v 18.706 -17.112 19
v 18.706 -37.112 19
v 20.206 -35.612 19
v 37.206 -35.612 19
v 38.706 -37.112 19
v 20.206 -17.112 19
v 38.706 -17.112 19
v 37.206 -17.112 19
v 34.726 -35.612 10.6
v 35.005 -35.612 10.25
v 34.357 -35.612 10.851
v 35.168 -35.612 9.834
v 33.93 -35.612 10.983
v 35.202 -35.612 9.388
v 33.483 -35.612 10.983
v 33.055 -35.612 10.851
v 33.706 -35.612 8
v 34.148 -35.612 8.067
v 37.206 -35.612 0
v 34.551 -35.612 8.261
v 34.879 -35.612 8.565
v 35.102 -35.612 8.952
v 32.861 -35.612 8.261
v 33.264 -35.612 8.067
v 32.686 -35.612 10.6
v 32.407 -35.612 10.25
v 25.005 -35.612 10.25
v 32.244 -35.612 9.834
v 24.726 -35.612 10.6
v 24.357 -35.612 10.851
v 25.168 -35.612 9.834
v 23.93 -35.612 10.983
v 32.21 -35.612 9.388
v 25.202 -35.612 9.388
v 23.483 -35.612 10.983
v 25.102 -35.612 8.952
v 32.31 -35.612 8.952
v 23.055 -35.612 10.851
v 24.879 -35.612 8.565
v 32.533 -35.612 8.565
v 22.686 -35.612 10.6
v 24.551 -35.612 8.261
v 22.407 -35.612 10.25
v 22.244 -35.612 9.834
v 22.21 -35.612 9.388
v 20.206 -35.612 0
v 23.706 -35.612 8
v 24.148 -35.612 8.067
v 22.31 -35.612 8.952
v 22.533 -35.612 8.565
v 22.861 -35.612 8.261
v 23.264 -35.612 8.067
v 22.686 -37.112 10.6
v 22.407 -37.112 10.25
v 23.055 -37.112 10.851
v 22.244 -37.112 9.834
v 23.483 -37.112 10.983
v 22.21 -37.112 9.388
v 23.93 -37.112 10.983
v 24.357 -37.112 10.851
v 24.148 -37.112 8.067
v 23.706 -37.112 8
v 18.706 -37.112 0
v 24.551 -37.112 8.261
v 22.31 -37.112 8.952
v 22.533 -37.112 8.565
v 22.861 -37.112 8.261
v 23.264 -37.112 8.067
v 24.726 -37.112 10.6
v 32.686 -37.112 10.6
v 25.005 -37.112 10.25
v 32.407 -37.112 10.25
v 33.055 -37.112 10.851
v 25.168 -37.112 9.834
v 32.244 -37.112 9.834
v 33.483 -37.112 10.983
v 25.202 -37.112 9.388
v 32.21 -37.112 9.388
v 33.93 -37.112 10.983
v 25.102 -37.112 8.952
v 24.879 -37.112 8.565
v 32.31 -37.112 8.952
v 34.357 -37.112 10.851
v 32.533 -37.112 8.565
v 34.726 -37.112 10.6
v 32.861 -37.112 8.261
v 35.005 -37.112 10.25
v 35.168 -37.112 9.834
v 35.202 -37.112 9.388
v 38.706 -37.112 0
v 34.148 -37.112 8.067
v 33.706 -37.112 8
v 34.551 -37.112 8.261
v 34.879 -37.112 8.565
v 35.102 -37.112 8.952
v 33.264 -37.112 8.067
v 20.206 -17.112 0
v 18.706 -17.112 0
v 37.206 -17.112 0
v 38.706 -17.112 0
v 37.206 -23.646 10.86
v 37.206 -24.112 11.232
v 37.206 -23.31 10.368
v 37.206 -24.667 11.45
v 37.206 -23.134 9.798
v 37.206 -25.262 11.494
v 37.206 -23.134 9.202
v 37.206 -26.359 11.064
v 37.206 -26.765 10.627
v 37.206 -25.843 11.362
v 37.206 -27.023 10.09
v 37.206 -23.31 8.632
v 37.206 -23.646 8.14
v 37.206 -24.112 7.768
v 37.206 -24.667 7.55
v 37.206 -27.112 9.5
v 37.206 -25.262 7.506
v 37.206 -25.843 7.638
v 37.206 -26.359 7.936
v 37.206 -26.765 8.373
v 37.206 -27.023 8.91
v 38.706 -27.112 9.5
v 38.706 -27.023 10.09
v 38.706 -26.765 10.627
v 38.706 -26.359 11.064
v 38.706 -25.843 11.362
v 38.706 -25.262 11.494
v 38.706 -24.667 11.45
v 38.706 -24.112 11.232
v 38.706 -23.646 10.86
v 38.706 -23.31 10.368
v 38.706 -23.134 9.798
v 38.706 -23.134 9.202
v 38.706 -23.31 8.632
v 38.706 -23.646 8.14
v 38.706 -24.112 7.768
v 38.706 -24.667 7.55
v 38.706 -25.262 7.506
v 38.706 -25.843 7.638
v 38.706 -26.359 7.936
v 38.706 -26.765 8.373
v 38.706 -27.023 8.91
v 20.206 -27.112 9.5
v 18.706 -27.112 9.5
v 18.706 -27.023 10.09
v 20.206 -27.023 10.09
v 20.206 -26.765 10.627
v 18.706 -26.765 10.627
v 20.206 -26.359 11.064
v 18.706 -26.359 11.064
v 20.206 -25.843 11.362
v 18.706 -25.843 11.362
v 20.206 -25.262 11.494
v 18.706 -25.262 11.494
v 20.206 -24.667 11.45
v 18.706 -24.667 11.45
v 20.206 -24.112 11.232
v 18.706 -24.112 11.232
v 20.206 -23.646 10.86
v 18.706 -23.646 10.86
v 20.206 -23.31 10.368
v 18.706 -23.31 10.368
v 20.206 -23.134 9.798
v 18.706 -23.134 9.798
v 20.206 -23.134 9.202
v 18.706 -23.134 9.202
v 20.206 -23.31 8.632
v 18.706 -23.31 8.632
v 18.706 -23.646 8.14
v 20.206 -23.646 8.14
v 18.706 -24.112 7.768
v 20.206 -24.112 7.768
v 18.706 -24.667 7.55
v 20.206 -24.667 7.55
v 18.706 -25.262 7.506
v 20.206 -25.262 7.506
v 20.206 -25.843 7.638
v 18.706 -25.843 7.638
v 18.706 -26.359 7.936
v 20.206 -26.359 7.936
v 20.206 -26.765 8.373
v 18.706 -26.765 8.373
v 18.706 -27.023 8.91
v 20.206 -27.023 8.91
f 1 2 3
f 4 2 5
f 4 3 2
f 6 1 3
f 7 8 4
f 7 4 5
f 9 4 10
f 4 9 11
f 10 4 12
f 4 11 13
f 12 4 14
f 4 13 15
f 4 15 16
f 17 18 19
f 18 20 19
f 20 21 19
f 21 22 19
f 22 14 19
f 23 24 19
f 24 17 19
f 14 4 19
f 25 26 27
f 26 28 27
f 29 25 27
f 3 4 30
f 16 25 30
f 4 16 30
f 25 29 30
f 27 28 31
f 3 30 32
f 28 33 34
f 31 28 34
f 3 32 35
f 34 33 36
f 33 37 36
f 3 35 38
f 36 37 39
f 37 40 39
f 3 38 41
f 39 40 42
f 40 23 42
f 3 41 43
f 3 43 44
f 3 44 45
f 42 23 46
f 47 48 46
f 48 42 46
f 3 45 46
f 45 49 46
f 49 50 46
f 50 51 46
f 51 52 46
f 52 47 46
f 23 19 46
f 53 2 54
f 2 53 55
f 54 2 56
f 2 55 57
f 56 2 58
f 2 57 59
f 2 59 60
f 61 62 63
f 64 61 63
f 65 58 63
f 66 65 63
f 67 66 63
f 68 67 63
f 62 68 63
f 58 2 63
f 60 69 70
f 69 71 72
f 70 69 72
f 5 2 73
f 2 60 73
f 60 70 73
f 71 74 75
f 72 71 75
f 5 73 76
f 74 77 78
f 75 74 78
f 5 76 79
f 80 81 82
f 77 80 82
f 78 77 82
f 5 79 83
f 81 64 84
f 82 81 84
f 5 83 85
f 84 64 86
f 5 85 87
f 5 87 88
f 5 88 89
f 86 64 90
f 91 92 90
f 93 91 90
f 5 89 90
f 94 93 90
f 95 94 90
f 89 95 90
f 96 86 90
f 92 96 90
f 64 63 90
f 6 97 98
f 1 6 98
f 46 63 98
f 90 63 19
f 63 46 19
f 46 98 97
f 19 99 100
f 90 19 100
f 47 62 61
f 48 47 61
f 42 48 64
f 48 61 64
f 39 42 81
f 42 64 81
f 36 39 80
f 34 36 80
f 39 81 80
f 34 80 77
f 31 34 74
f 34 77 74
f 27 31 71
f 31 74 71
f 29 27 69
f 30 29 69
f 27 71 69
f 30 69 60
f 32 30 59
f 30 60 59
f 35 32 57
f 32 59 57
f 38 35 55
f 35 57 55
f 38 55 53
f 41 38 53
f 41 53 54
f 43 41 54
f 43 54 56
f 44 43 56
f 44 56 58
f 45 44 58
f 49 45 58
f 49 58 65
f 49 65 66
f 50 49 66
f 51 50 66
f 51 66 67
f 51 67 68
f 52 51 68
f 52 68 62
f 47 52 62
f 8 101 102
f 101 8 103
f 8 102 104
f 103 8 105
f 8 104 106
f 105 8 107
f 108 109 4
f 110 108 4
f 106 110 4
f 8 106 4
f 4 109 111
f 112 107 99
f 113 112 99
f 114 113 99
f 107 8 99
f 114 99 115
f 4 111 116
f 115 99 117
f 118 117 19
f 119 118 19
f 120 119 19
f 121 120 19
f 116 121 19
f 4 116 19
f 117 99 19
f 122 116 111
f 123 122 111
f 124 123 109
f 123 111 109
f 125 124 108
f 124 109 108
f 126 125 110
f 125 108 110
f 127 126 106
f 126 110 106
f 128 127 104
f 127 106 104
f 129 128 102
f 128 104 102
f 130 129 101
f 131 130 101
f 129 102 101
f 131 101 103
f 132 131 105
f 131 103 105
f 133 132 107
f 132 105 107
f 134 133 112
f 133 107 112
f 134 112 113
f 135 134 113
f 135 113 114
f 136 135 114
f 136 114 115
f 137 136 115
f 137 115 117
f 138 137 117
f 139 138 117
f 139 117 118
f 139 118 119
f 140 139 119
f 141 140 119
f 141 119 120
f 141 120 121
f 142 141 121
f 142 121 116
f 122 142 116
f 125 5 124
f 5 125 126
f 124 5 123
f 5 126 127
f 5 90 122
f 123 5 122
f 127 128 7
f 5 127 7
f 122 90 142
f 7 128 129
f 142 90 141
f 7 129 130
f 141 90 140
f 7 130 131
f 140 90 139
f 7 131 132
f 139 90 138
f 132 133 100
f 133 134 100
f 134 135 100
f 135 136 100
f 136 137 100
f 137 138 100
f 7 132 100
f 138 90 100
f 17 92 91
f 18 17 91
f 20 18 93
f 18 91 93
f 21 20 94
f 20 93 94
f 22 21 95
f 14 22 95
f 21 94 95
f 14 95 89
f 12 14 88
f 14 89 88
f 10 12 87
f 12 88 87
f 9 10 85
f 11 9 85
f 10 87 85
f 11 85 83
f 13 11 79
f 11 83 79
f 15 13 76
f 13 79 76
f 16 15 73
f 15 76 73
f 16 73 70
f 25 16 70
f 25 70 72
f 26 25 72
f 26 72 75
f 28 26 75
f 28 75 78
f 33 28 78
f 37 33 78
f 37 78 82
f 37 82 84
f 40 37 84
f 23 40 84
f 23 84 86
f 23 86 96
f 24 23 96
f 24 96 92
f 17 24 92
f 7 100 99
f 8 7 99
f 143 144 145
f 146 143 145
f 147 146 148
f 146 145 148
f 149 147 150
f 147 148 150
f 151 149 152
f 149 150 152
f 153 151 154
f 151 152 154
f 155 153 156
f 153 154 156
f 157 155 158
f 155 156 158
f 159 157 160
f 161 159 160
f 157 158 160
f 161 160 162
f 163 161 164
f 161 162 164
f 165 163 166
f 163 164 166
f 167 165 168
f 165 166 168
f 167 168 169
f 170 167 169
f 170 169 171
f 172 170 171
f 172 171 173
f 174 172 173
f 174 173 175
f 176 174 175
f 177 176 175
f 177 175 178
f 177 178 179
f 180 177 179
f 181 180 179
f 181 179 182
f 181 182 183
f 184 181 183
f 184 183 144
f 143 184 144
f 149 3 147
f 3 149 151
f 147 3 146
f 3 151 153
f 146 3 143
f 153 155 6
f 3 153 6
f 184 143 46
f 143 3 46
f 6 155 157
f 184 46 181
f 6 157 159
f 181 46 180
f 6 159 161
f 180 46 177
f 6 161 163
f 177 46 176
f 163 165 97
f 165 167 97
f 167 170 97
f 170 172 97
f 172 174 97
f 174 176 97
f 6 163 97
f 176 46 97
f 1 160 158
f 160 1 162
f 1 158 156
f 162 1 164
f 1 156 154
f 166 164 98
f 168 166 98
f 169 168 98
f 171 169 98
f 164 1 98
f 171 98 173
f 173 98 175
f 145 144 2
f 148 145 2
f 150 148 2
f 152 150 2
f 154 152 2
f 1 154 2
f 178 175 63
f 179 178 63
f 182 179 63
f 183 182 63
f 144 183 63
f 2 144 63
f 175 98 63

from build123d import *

# Parameters (mm, degrees)
EXTRUSION1_DEPTH = 19
ESQUISSE2_R      = 1.5
EXTRUSION2_DEPTH = 5
ESQUISSE3_R      = 2
EXTRUSION3_DEPTH = 47.241826523


with BuildPart() as part:
    # Esquisse1 → Extrusion1 (new body)
    with BuildSketch(Plane.XY):
        Polygon((18.706066256, -17.112080516), (18.706066256, -37.112080516), (38.706066256, -37.112080516), (38.706066256, -17.112080516), (37.206066256, -17.112080516), (37.206066256, -35.612080516), (20.206066256, -35.612080516), (20.206066256, -17.112080516), align=None)
    extrude(amount=EXTRUSION1_DEPTH)

    # Esquisse2 → Extrusion2 (cut)
    with BuildSketch(Plane.XZ.offset(37.112080516)):
        with Locations(Location((23.706066256, 9.5, 0), (0, 0, 270))):
            Circle(ESQUISSE2_R)
        with Locations(Location((33.706066256, 9.5, 0), (0, 0, 270))):
            Circle(ESQUISSE2_R)
    extrude(amount=-EXTRUSION2_DEPTH, mode=Mode.SUBTRACT)

    # Esquisse3 → Extrusion3 (cut, through all)
    with BuildSketch(Plane.ZY.offset(-18.706066256)):
        with Locations(Location((9.5, -25.112080516, 0), (0, 0, 270))):
            Circle(ESQUISSE3_R)
    extrude(amount=-EXTRUSION3_DEPTH, mode=Mode.SUBTRACT)


solid = part.part
